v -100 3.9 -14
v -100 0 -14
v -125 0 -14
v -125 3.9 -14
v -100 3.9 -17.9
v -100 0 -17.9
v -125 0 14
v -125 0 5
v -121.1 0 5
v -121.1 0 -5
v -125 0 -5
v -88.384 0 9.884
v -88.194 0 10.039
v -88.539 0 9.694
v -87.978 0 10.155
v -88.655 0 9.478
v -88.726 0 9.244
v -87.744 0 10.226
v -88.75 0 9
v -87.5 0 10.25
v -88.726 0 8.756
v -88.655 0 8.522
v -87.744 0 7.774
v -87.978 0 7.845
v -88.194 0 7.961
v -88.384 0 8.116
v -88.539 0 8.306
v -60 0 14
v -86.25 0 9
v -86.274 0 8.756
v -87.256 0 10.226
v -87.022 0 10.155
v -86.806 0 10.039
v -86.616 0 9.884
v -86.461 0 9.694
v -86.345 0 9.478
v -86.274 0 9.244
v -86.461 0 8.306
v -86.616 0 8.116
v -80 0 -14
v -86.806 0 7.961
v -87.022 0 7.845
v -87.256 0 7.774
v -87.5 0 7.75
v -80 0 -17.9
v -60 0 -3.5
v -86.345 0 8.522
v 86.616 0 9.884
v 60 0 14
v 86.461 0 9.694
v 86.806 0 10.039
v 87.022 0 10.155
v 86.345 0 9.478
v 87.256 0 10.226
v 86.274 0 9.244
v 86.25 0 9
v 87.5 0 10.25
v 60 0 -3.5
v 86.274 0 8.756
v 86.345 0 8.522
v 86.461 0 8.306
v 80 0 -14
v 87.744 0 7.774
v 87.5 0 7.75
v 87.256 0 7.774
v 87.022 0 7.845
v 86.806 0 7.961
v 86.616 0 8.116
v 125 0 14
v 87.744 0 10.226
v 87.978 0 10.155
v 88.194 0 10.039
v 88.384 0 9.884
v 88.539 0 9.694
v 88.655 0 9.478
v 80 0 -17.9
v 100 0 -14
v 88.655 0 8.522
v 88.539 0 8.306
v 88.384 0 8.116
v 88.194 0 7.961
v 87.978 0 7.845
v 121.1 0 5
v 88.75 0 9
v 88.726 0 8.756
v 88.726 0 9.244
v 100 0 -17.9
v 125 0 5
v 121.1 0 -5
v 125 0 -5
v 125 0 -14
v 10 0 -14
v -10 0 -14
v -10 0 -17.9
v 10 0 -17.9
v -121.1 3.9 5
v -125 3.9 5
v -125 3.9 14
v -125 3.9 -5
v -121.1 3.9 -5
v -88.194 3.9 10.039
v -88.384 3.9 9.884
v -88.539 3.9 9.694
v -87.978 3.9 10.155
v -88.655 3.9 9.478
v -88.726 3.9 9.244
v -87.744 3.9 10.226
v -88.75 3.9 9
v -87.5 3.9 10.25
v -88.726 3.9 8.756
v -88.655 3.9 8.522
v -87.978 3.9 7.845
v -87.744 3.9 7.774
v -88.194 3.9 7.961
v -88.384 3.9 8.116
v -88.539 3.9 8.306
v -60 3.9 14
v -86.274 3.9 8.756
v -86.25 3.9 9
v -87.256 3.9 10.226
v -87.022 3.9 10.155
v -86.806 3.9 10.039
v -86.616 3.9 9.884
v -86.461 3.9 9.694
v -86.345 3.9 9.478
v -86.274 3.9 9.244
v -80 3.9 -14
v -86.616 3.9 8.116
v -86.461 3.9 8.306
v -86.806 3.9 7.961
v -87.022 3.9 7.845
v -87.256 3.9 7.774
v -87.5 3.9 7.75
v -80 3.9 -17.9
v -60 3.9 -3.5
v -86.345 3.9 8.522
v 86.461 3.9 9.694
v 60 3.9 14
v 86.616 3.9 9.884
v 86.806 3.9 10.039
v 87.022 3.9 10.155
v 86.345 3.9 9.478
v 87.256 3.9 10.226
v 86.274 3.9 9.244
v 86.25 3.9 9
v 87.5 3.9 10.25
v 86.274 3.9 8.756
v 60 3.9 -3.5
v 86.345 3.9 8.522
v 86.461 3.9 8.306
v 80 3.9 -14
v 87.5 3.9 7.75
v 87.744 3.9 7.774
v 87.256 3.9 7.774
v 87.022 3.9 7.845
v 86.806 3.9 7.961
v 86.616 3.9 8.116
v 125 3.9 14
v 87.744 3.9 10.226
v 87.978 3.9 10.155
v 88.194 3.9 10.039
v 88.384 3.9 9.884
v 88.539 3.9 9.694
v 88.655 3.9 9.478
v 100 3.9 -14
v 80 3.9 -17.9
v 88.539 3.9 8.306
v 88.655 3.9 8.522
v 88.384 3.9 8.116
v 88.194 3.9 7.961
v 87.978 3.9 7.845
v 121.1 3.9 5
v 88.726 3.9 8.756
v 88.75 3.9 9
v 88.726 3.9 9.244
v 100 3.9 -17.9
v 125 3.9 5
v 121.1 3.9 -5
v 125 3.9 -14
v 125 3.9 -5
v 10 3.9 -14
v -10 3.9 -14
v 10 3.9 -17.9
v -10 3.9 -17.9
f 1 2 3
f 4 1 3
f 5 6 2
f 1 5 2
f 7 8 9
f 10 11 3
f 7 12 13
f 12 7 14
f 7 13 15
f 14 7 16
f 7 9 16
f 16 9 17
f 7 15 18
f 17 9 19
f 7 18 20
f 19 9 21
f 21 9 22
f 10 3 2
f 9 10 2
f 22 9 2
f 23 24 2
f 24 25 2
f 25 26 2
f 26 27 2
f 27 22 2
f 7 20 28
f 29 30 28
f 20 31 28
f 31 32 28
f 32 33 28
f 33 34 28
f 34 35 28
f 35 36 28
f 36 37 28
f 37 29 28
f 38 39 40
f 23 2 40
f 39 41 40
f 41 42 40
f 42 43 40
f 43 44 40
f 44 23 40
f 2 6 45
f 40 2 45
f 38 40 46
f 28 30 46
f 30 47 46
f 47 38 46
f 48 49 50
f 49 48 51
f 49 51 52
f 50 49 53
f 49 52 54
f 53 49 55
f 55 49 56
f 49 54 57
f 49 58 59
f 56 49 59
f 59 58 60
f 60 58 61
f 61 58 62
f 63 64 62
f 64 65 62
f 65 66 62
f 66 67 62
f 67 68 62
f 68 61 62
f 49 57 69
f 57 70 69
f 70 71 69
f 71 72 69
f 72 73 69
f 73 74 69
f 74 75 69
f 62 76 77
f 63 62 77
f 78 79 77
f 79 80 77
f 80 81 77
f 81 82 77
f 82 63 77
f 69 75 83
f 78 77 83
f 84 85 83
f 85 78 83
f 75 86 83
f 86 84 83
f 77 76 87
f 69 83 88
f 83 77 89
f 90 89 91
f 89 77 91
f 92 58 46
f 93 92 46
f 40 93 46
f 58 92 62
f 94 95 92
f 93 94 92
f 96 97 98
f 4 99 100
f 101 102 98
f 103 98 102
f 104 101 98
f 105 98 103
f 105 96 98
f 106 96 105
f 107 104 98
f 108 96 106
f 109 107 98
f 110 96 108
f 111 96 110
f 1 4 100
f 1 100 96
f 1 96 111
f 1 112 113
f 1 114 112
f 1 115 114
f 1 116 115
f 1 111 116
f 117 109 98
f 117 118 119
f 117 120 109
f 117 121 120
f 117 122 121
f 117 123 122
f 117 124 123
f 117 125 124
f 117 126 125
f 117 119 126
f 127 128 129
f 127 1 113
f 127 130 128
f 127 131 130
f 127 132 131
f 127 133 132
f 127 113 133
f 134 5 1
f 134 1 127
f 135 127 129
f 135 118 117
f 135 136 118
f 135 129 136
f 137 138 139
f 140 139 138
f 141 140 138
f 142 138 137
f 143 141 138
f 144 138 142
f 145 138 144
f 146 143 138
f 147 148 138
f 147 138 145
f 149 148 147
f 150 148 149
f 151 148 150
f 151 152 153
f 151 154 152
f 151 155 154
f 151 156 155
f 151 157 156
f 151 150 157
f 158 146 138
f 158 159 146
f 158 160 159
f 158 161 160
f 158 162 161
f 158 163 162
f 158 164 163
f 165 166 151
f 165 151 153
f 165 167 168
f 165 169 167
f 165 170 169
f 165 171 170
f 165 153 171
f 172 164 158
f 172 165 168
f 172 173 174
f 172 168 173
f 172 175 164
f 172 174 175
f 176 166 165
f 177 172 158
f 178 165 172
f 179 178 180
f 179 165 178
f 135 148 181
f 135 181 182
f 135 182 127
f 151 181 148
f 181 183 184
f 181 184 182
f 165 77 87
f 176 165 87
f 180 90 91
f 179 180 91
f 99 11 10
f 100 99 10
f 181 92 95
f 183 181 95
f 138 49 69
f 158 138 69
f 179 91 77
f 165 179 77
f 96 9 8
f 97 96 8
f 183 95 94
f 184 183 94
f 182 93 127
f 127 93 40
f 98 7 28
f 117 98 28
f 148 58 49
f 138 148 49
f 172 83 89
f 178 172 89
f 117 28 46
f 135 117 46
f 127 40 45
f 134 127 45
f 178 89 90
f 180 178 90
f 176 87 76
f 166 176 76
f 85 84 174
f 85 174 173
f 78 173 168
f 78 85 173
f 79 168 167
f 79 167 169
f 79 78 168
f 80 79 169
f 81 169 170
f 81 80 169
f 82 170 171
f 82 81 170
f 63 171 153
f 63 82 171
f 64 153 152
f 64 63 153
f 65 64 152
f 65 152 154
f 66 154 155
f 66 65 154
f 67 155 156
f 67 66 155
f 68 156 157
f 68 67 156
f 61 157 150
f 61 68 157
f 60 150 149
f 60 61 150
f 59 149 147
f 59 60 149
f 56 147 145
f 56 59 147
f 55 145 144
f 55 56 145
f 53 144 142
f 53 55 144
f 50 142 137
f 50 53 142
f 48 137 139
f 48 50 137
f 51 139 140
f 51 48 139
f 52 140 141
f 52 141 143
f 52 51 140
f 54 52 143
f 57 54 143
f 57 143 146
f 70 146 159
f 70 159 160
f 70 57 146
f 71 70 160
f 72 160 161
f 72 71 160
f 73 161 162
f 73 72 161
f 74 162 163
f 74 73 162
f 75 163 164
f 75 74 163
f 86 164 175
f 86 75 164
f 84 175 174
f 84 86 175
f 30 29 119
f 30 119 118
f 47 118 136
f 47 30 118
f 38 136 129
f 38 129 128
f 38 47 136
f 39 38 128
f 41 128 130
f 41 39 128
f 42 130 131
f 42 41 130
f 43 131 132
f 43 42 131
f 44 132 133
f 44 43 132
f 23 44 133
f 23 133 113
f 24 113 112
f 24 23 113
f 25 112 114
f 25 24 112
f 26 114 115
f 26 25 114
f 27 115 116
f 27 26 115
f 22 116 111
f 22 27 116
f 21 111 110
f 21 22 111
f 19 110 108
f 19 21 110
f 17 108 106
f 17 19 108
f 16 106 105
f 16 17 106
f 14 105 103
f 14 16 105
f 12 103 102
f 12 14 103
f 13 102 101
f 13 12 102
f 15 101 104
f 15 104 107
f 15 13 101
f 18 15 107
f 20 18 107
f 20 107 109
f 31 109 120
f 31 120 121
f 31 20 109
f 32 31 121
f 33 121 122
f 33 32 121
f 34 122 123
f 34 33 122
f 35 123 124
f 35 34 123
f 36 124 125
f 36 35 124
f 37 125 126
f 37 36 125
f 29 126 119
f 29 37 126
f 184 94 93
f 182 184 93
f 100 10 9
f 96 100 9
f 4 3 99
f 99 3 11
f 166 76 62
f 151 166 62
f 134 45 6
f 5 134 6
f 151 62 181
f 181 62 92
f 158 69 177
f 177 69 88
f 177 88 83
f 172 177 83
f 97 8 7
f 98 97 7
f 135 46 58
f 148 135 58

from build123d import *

# Parameters (mm, degrees)
SKETCH1_R           = 1.25
BOSS_EXTRUDE1_DEPTH = 3.9


with BuildPart() as part:
    # Sketch1 → Boss-Extrude1 (new body)
    with BuildSketch(Plane(origin=(0, 0, 0), x_dir=(1, 0, 0), z_dir=(0, 1, 0))):
        Polygon((-100, 14), (-125, 14), (-125, 5), (-121.1, 5), (-121.1, -5), (-125, -5), (-125, -14), (-60, -14), (-60, 3.5), (60, 3.5), (60, -14), (125, -14), (125, -5), (121.1, -5), (121.1, 5), (125, 5), (125, 14), (100, 14), (100, 17.9), (80, 17.9), (80, 14), (10, 14), (10, 17.9), (-10, 17.9), (-10, 14), (-80, 14), (-80, 17.9), (-100, 17.9), align=None)
        with Locations((-87.5, -9)):
            Circle(SKETCH1_R, mode=Mode.SUBTRACT)
        with Locations((87.5, -9)):
            Circle(SKETCH1_R, mode=Mode.SUBTRACT)
    extrude(amount=BOSS_EXTRUDE1_DEPTH)


solid = part.part
